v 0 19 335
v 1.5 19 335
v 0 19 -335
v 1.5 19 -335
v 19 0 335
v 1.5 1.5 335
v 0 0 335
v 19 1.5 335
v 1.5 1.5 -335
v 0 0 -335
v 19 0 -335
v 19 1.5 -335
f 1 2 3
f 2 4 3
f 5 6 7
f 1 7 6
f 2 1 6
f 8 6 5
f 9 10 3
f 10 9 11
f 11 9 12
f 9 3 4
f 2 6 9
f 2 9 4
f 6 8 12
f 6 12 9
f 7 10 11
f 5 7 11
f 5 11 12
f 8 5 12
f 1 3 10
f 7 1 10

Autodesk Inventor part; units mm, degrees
ref_plane "YZ Plane" through (0, 0, 0) normal (1, 0, 0) x (0, 1, 0)
ref_plane "XZ Plane" through (0, 0, 0) normal (0, 1, 0) x (-1, 0, 0)
ref_plane "XY Plane" through (0, 0, 0) normal (0, 0, 1) x (1, 0, 0)
sketch "Sketch2" plane through (0, 0, 0) normal (0, 0, 1) x (1, 0, 0)
  line L0 (0, 0) -> (1.5, 0)
  line L1 (1.5, 0) -> (1.5, 19)
  line L2 (1.5, 19) -> (0, 19)
  line L3 (0, 19) -> (0, 0)
  line L4 (0, 0) -> (19, 0)
  line L5 (19, 0) -> (19, 1.5)
  line L6 (19, 1.5) -> (0, 1.5)
  line L7 (0, 1.5) -> (0, 0)
  point P0 (1.5, 1.5)
  dimension "d0" = 1.5
  dimension "d1" = 19
  dimension "d2" = 19
  dimension "d3" = 1.5
extrude "Extrusion1" add sketch "Sketch2" along normal mid plane 670
properties part number "GUIA_CANALETA"
